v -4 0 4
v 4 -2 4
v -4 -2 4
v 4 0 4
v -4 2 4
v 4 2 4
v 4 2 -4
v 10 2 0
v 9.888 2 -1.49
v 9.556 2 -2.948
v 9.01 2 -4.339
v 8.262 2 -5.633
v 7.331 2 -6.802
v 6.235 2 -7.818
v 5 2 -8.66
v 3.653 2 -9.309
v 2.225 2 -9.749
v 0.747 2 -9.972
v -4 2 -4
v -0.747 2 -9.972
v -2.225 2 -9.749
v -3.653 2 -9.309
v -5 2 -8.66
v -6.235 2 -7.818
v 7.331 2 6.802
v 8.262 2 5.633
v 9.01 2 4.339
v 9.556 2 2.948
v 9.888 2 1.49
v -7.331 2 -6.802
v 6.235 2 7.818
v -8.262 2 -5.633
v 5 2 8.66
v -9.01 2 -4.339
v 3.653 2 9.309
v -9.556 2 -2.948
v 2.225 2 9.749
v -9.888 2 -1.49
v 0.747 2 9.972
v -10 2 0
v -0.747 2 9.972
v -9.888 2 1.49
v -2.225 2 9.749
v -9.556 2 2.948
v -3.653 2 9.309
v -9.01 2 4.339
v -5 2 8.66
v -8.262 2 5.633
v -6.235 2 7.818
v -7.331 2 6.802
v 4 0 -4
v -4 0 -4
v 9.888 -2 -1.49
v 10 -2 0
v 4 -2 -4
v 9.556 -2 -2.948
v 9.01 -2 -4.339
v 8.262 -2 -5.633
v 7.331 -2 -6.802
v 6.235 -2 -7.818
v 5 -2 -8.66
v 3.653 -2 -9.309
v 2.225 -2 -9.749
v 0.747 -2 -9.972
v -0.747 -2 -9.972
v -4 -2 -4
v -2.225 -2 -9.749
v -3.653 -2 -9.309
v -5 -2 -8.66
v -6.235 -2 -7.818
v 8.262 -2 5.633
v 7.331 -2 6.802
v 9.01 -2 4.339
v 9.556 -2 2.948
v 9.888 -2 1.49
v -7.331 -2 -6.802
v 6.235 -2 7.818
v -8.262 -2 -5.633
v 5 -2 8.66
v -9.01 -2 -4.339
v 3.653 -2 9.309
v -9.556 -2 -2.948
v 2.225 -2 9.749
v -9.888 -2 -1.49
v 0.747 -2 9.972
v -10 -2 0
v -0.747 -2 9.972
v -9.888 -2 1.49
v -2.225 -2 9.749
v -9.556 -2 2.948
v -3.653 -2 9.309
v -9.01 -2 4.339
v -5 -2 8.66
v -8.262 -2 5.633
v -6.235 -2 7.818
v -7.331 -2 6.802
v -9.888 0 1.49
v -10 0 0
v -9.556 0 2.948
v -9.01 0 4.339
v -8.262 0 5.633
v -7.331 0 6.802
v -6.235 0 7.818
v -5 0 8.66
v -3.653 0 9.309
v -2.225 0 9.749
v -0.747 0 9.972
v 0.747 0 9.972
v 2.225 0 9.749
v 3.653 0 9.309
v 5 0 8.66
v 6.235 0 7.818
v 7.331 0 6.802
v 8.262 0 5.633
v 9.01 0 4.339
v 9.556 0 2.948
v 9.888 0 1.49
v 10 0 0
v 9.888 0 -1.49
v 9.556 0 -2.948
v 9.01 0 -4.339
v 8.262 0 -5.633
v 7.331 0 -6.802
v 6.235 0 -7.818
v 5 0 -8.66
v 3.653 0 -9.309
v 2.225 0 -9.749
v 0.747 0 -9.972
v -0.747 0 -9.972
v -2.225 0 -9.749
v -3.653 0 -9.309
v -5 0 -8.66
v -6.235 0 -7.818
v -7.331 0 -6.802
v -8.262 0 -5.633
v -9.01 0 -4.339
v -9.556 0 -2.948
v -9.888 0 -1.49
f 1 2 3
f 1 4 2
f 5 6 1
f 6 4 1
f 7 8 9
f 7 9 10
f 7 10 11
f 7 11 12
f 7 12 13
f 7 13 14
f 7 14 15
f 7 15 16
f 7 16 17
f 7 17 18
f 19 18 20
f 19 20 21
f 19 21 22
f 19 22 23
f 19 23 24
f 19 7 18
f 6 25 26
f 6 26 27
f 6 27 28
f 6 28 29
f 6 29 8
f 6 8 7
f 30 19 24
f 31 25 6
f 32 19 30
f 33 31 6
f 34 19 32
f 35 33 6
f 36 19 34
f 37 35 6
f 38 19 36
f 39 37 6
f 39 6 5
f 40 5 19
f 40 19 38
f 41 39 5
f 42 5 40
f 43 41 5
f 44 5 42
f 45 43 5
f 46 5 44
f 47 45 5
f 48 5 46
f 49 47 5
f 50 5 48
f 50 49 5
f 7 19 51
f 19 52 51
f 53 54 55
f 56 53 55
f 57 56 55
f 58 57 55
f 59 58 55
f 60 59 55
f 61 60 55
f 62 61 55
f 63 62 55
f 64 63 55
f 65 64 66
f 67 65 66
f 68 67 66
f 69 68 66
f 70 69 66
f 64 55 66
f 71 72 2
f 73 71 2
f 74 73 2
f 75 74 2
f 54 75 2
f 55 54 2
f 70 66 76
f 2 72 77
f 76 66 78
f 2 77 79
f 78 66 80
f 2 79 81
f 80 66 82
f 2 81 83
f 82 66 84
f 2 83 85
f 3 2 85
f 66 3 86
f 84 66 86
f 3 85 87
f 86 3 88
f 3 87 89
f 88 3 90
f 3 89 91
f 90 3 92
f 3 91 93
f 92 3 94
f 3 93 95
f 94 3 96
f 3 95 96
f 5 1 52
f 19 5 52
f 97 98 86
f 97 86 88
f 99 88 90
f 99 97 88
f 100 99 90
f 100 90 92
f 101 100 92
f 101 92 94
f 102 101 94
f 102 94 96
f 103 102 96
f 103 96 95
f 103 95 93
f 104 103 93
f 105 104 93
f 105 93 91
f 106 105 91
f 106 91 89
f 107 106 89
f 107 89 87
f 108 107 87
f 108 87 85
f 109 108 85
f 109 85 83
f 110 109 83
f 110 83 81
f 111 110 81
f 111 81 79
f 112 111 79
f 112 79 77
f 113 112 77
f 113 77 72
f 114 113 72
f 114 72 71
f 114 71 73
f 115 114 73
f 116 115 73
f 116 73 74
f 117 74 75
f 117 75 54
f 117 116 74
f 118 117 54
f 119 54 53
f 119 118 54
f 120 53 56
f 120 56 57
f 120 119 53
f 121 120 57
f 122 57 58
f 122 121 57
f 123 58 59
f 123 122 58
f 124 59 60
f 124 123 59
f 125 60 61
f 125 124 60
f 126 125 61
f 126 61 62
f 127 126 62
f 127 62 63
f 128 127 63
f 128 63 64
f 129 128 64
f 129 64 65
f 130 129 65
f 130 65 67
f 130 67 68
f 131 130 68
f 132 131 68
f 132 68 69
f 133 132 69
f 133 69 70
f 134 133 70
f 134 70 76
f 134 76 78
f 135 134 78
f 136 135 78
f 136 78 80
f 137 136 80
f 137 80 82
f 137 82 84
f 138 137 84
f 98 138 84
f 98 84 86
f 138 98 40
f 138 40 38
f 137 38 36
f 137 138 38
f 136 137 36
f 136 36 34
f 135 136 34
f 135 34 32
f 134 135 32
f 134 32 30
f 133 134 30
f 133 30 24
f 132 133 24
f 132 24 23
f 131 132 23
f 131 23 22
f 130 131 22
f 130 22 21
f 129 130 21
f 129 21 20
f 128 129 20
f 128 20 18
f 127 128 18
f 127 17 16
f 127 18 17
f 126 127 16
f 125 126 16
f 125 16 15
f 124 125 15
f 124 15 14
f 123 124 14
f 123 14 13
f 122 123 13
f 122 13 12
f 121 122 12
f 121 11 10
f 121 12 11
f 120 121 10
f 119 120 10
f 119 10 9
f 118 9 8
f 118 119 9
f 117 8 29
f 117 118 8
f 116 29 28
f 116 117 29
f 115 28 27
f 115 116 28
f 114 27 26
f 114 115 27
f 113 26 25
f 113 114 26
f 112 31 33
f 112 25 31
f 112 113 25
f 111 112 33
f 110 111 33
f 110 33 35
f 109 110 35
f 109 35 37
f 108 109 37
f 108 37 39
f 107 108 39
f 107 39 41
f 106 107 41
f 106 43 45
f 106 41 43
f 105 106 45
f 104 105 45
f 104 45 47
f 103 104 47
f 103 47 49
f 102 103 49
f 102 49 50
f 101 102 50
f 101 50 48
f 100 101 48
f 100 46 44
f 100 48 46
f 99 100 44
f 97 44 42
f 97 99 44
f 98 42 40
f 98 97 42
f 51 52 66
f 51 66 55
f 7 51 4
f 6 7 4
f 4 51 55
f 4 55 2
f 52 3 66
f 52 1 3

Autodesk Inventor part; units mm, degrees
ref_plane "YZ Plane" through (0, 0, 0) normal (1, 0, 0) x (0, 1, 0)
ref_plane "XZ Plane" through (0, 0, 0) normal (0, 1, 0) x (-1, 0, 0)
ref_plane "XY Plane" through (0, 0, 0) normal (0, 0, 1) x (1, 0, 0)
sketch "Эскиз1" plane through (0, 0, 0) normal (0, 1, 0) x (-1, 0, 0)
  line L0 (4, -4) -> (-4, -4)
  line L1 (-4, -4) -> (-4, 4)
  line L2 (-4, 4) -> (4, 4)
  line L3 (4, 4) -> (4, -4)
  circle A0 centre (0, 0) radius 10
  point P0 (-4, 0)
  point P1 (0, -4)
  dimension "d0" = 8
  dimension "d1" = 20
extrude "Выдавливание1" add sketch "Эскиз1" along normal mid plane 4
thread "Резьба1" size "M20x1" class "6g" standard "ISO Metric profile" length 20
properties part number "80. Стопор предохранителя"
